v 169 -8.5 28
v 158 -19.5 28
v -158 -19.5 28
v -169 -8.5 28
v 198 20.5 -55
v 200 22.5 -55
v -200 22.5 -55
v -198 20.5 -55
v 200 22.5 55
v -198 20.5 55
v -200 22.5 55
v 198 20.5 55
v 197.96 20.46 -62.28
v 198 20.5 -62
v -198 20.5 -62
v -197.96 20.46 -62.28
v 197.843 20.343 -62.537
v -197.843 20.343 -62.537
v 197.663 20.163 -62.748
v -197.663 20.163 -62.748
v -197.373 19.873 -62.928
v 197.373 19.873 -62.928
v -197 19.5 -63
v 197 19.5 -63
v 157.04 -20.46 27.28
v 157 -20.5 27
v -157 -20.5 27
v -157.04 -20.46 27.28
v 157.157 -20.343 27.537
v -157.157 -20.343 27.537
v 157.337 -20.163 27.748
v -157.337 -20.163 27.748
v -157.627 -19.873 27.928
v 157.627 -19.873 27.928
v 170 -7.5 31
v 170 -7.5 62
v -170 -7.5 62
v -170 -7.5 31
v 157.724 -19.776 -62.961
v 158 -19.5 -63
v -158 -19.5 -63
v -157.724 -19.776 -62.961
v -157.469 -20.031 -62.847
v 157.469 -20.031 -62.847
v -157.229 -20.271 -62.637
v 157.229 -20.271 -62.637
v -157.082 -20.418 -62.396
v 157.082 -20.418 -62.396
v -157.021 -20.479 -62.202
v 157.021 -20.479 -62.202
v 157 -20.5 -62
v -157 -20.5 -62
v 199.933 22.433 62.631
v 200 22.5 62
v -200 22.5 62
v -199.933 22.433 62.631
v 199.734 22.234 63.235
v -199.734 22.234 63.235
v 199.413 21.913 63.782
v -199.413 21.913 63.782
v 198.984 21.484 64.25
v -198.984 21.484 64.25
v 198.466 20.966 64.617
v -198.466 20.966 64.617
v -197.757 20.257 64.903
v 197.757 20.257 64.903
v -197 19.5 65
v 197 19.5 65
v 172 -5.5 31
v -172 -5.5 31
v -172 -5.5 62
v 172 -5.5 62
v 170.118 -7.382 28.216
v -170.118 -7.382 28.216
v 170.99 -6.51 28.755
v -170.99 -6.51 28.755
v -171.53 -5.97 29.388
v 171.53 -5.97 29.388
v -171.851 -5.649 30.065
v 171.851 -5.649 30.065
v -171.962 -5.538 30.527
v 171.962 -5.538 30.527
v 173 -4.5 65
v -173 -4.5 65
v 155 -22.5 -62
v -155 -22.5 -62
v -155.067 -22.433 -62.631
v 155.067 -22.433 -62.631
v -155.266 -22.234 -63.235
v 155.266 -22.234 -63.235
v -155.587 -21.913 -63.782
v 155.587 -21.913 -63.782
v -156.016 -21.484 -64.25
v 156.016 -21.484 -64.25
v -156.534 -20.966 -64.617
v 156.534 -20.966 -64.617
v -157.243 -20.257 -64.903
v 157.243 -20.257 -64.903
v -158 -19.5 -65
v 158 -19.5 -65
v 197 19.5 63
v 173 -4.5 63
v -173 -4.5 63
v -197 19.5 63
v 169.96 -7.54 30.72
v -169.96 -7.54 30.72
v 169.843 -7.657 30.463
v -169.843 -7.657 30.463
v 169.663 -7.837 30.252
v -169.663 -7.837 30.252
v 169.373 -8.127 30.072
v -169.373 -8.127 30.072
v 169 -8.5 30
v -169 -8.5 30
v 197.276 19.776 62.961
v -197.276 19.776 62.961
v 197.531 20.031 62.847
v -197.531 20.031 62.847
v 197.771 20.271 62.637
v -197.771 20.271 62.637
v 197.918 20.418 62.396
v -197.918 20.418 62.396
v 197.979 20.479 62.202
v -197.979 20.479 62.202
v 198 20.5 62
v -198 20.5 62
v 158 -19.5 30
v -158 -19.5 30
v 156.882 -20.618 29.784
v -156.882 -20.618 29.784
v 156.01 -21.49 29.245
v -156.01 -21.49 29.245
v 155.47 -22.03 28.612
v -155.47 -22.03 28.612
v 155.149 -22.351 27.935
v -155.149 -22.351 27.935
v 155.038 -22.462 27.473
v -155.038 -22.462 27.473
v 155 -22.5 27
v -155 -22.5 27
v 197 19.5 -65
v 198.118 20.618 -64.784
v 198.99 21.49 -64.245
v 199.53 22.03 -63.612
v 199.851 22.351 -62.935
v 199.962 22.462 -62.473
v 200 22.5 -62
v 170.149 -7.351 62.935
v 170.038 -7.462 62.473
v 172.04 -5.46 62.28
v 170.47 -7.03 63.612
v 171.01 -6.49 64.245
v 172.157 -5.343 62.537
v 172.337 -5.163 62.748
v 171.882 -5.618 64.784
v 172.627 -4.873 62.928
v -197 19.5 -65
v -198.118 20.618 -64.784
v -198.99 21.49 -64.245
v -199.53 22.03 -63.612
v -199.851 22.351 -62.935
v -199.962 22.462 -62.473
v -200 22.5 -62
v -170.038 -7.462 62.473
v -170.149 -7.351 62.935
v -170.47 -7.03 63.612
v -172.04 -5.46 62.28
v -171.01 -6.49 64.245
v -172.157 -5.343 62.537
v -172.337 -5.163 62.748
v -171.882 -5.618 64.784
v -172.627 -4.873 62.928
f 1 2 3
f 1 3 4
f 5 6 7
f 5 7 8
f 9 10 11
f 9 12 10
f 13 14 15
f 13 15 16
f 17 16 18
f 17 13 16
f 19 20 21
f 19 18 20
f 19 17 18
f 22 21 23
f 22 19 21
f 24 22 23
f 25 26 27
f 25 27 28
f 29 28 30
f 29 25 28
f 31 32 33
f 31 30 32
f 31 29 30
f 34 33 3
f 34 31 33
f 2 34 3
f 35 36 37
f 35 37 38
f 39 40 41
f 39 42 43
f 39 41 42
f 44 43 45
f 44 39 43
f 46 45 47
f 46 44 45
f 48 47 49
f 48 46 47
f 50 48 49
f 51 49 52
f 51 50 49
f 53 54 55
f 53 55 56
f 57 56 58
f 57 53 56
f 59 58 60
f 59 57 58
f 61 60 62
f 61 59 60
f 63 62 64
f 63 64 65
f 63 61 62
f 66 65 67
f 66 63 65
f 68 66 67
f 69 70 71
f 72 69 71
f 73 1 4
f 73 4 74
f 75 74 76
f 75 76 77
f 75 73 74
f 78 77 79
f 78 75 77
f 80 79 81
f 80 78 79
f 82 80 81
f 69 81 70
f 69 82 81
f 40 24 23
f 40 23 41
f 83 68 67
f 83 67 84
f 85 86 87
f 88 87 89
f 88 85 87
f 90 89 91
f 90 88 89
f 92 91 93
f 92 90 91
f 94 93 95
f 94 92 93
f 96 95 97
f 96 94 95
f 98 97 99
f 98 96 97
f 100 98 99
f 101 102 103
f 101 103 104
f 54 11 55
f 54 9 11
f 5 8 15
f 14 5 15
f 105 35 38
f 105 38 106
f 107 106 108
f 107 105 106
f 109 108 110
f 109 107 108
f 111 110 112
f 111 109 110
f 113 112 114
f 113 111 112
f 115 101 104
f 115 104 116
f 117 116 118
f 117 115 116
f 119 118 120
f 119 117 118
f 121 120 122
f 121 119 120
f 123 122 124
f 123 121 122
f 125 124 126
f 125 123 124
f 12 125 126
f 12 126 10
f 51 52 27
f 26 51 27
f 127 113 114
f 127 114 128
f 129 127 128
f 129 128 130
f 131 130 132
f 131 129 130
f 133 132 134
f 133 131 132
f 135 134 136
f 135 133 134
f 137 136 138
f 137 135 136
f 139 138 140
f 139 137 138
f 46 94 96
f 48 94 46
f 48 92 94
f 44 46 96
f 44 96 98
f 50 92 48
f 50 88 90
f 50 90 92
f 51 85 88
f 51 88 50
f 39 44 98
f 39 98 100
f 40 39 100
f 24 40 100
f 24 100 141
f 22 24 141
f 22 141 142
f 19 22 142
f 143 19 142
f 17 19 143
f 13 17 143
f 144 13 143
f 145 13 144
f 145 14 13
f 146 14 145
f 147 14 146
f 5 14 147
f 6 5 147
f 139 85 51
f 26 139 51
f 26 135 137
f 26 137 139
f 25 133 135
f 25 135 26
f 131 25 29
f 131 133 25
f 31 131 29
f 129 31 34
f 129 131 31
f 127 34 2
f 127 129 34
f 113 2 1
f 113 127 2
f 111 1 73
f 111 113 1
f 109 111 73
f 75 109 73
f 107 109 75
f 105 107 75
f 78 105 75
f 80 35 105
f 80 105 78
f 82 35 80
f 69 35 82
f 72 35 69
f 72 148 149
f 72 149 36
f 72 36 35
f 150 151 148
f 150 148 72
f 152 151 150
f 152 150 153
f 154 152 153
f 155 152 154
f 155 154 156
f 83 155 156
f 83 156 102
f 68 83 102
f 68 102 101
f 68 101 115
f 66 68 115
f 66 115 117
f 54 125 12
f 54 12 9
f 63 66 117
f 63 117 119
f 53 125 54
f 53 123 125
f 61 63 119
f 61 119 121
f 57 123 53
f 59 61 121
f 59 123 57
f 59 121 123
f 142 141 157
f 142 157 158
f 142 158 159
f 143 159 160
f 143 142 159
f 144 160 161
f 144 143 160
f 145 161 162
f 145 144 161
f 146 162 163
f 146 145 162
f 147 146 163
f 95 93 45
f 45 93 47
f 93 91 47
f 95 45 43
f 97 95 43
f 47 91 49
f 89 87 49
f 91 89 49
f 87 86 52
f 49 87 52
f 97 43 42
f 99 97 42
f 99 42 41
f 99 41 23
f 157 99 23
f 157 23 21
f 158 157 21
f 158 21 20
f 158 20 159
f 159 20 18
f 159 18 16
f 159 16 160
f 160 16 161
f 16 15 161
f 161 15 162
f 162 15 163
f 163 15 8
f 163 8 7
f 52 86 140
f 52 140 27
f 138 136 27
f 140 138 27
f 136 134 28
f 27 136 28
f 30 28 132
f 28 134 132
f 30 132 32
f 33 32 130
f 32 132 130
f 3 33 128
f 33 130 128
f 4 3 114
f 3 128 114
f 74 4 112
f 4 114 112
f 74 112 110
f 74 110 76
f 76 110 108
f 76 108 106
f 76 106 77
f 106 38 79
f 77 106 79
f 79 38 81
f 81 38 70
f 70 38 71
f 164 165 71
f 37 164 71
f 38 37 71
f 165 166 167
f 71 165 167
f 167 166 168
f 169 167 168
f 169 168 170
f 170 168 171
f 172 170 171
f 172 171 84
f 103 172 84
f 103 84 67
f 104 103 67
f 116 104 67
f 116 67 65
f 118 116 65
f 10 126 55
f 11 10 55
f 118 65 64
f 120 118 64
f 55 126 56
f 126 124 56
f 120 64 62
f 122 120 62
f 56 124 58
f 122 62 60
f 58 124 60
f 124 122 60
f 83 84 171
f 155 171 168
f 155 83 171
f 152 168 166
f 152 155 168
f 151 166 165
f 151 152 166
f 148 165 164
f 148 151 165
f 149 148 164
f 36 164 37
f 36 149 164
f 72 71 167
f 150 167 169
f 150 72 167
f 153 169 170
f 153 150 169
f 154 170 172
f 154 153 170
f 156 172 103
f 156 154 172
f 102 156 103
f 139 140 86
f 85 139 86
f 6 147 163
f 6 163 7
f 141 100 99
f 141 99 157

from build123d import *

# Parameters (mm, degrees)
VYSUNOUT_TENKOST_NN_1_DEPTH = 200
ODEBRAT_VYSUNUT_M1_REACH    = 241.596


with BuildPart() as part:
    # Skica1 → Vysunout tenkostěnný1 (new, symmetric)
    with BuildSketch(Plane(origin=(0, 0, 0), x_dir=(0, 0, -1), z_dir=(1, 0, 0))):
        with BuildLine():
            Line((-55, 22.5), (-62, 22.5))
            ThreePointArc((-62, 22.5), (-64.121320344, 21.621320344), (-65, 19.5))
            Line((-65, 19.5), (-65, -4.5))
            ThreePointArc((-65, -4.5), (-64.121320344, -6.621320344), (-62, -7.5))
            Line((-62, -7.5), (-31, -7.5))
            ThreePointArc((-31, -7.5), (-30.292893219, -7.792893219), (-30, -8.5))
            Line((-30, -8.5), (-30, -19.5))
            ThreePointArc((-30, -19.5), (-29.121320344, -21.621320344), (-27, -22.5))
            Line((-27, -22.5), (62, -22.5))
            ThreePointArc((62, -22.5), (64.121320344, -21.621320344), (65, -19.5))
            Line((65, -19.5), (65, 19.5))
            ThreePointArc((65, 19.5), (64.121320344, 21.621320344), (62, 22.5))
            Line((62, 22.5), (55, 22.5))
            Line((55, 22.5), (55, 20.5))
            Line((55, 20.5), (62, 20.5))
            ThreePointArc((62, 20.5), (62.707106781, 20.207106781), (63, 19.5))
            Line((63, 19.5), (63, -19.5))
            ThreePointArc((63, -19.5), (62.707106781, -20.207106781), (62, -20.5))
            Line((62, -20.5), (-27, -20.5))
            ThreePointArc((-27, -20.5), (-27.707106781, -20.207106781), (-28, -19.5))
            Line((-28, -19.5), (-28, -8.5))
            ThreePointArc((-28, -8.5), (-28.878679656, -6.378679656), (-31, -5.5))
            Line((-31, -5.5), (-62, -5.5))
            ThreePointArc((-62, -5.5), (-62.707106781, -5.207106781), (-63, -4.5))
            Line((-63, -4.5), (-63, 19.5))
            ThreePointArc((-63, 19.5), (-62.707106781, 20.207106781), (-62, 20.5))
            Line((-62, 20.5), (-55, 20.5))
            Line((-55, 20.5), (-55, 22.5))
        make_face()
    extrude(amount=VYSUNOUT_TENKOST_NN_1_DEPTH, both=True)

    # Odebrat vysunutím1: up to this face of the body (flat: up to its plane)
    odebrat_vysunut_m1_end = Plane(part.part.faces().sort_by_distance((0, 0, -65))[0])
    # Skica2 → Odebrat vysunutím1 (cut, up to the picked face)
    with BuildSketch(Plane.XY.offset(65), mode=Mode.PRIVATE) as odebrat_vysunut_m1_sk1:
        Polygon((-155, -22.5), (-200, 22.5), (-200, -22.5), align=None)
    odebrat_vysunut_m1_tool1 = split(extrude(odebrat_vysunut_m1_sk1.sketch, amount=-ODEBRAT_VYSUNUT_M1_REACH, mode=Mode.PRIVATE), bisect_by=odebrat_vysunut_m1_end, keep=Keep.BOTH, mode=Mode.PRIVATE)
    # Skica2 → Odebrat vysunutím1 (cut, up to the picked face)
    with BuildSketch(Plane.XY.offset(65), mode=Mode.PRIVATE) as odebrat_vysunut_m1_sk2:
        Polygon((200, 22.5), (200, -22.5), (155, -22.5), align=None)
    odebrat_vysunut_m1_tool2 = split(extrude(odebrat_vysunut_m1_sk2.sketch, amount=-ODEBRAT_VYSUNUT_M1_REACH, mode=Mode.PRIVATE), bisect_by=odebrat_vysunut_m1_end, keep=Keep.BOTH, mode=Mode.PRIVATE)
    add(odebrat_vysunut_m1_tool1.solids().sort_by(Axis((-185, -7.5, 65), (0, 0, -1)))[0], mode=Mode.SUBTRACT)
    add(odebrat_vysunut_m1_tool2.solids().sort_by(Axis((185, -7.5, 65), (0, 0, -1)))[0], mode=Mode.SUBTRACT)


solid = part.part
